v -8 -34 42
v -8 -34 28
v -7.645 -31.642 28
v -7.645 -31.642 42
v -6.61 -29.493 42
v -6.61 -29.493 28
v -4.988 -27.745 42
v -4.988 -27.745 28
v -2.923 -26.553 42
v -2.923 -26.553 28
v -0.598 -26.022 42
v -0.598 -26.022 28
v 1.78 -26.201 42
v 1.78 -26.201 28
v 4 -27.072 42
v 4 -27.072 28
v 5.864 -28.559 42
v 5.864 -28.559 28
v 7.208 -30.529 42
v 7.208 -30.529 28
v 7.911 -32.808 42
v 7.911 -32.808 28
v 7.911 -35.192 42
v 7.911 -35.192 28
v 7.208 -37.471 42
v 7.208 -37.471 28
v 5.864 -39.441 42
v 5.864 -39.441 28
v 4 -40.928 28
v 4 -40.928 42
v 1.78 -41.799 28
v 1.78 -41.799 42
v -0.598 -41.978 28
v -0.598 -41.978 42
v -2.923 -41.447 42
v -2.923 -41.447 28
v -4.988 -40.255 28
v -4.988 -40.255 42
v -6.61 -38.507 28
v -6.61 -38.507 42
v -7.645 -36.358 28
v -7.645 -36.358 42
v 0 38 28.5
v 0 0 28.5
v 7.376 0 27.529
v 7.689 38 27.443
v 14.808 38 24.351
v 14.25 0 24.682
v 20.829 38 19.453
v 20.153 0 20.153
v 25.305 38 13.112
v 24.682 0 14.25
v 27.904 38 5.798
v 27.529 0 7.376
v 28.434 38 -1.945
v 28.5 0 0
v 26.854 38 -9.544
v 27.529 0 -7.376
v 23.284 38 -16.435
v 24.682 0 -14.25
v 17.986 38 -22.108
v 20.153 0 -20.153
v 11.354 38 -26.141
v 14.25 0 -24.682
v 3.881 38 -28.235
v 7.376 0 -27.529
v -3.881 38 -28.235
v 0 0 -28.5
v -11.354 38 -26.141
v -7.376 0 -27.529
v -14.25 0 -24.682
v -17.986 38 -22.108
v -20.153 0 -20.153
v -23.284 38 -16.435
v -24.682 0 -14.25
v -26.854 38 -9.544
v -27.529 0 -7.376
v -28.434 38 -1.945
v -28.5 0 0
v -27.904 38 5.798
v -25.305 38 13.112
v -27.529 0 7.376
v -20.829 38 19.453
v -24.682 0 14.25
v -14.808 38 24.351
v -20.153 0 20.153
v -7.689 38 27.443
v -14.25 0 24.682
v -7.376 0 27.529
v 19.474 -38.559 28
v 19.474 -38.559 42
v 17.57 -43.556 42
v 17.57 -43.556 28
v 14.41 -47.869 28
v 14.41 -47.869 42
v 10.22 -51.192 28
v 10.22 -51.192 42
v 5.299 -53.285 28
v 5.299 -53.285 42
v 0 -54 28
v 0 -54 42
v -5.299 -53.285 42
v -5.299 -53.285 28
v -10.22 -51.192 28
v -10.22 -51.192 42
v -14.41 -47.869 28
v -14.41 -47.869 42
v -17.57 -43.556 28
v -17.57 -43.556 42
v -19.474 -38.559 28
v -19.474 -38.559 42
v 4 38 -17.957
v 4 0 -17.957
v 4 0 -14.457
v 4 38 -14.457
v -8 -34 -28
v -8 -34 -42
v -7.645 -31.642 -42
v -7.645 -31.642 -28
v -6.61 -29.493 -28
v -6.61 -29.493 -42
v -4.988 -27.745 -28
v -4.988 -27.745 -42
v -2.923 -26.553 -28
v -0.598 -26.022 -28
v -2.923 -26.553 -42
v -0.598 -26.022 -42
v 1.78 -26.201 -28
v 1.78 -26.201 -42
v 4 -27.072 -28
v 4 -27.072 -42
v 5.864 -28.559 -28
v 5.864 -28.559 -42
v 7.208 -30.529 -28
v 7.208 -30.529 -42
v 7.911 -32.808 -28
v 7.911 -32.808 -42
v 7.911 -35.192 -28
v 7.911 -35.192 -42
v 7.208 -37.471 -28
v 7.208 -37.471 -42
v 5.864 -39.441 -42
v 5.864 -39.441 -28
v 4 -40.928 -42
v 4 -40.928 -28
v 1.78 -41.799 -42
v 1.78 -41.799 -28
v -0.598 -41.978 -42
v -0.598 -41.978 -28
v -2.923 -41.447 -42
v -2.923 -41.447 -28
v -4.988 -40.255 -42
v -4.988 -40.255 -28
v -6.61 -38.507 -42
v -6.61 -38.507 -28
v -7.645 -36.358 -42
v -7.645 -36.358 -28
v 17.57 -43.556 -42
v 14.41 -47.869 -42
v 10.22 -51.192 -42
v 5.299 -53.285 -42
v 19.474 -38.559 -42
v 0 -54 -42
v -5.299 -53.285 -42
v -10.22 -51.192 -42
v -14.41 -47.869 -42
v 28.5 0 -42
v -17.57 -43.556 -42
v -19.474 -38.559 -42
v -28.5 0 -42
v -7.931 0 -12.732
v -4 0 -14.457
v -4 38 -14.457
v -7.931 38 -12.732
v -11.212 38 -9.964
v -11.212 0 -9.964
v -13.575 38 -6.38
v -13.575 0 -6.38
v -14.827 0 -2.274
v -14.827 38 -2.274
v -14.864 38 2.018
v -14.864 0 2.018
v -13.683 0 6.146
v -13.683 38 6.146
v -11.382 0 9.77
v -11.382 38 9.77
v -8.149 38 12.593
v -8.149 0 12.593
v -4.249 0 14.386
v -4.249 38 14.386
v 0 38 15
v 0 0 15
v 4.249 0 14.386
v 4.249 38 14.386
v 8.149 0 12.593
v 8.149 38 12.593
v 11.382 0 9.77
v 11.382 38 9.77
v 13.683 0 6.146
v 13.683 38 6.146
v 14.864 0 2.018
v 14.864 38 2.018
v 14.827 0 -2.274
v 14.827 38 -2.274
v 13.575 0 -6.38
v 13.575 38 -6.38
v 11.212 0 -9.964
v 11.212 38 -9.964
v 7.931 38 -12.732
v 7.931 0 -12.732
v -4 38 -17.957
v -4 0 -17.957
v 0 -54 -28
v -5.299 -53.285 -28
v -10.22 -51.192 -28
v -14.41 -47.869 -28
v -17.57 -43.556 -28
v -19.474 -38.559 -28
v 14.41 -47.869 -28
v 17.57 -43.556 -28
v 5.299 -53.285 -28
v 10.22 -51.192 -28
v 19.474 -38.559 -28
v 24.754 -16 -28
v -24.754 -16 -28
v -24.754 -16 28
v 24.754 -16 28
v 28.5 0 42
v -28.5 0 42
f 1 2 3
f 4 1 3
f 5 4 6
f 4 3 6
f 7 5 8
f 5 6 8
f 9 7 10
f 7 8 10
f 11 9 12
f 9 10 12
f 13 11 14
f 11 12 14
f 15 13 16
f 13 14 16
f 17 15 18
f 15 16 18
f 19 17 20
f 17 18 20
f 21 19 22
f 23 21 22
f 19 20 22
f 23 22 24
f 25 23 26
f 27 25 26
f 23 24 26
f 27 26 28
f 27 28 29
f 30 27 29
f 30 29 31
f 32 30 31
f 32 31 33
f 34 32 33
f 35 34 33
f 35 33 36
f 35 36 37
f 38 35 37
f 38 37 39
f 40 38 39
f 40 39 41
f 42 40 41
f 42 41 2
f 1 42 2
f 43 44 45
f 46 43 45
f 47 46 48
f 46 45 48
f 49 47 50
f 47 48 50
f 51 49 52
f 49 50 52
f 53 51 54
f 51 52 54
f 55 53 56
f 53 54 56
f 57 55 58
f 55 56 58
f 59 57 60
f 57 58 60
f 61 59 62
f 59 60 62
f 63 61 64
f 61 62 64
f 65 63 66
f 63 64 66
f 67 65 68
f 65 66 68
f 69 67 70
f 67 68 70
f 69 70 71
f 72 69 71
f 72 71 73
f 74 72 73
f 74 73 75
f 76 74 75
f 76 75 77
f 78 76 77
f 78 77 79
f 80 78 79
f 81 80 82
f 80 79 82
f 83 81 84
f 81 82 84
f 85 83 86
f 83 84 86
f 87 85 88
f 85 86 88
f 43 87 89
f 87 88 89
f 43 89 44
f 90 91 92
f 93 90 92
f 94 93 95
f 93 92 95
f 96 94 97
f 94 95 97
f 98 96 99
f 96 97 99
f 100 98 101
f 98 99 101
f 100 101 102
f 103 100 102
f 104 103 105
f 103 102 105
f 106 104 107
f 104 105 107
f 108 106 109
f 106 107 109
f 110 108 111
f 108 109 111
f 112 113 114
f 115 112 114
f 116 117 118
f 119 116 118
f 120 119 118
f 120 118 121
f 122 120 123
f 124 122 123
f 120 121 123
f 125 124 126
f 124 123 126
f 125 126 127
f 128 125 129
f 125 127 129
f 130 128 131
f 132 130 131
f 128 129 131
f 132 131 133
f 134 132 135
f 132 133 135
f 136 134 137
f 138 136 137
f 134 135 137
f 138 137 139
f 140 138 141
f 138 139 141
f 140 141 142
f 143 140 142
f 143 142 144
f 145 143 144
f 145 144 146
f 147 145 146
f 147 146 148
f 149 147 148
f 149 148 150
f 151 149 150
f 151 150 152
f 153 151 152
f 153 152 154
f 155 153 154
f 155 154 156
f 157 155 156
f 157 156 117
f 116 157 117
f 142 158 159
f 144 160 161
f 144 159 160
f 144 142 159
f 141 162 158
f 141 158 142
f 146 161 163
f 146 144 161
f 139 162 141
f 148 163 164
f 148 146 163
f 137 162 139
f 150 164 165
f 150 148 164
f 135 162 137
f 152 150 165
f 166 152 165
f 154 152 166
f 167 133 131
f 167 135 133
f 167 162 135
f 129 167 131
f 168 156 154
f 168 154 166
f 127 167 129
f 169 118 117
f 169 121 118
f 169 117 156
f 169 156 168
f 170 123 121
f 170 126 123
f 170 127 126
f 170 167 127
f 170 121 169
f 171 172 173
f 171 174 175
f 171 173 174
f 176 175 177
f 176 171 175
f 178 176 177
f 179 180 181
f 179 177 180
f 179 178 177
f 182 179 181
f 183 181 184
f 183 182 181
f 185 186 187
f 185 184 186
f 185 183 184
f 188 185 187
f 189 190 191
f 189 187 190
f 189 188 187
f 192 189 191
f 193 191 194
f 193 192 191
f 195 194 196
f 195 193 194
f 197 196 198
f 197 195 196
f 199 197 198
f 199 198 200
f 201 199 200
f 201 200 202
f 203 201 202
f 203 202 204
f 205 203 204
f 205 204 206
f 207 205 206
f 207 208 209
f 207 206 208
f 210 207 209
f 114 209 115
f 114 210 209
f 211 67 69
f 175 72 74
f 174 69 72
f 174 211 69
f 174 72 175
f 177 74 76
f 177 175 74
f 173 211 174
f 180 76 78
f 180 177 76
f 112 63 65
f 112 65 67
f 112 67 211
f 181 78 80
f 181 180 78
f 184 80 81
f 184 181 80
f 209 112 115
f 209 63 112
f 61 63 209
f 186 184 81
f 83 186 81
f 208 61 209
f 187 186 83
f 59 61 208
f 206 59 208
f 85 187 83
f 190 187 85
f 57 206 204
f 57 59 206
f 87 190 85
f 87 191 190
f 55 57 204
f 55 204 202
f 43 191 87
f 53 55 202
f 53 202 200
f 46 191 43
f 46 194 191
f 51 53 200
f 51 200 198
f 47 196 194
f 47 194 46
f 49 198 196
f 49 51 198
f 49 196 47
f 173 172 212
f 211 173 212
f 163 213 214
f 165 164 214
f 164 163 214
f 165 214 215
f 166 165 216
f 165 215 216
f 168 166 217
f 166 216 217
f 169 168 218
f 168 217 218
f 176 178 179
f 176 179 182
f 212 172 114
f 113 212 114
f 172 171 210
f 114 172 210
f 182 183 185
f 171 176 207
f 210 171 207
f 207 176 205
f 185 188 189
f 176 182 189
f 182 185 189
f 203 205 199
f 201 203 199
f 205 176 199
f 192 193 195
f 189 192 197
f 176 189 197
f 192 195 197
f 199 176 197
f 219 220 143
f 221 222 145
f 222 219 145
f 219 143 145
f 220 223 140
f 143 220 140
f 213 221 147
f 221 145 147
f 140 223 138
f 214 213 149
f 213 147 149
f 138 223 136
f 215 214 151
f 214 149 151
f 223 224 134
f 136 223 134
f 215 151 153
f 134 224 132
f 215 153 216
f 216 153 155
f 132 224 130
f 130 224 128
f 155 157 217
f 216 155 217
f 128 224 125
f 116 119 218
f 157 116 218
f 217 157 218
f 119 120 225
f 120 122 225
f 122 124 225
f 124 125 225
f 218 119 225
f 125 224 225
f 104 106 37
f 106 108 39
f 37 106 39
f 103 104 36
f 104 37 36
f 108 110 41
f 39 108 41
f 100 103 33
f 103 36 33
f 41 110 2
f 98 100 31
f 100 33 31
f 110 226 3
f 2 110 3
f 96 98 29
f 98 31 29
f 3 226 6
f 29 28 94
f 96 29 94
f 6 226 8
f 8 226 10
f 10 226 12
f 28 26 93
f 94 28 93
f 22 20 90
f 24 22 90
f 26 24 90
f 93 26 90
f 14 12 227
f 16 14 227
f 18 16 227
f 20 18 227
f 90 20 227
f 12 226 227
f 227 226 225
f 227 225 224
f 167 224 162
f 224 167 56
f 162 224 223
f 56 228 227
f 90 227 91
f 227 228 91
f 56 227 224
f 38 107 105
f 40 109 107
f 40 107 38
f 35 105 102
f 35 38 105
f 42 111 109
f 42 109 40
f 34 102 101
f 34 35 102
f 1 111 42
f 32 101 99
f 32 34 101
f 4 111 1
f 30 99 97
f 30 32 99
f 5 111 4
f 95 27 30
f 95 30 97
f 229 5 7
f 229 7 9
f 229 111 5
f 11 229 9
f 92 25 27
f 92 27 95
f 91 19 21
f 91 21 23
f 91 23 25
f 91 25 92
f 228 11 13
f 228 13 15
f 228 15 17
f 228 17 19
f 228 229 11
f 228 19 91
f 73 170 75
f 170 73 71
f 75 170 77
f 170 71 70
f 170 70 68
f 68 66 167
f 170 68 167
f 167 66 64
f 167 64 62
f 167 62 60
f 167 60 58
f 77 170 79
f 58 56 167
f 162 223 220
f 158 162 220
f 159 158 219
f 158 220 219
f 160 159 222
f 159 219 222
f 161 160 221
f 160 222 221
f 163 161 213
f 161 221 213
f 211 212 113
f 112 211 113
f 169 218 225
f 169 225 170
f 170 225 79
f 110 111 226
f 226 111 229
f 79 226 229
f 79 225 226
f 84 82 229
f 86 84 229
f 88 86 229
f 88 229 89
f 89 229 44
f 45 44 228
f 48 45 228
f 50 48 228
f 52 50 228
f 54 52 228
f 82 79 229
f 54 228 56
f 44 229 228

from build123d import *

# Parameters (mm, degrees)
SKETCH1_R           = 28.5
SKETCH1_R_2         = 15
BOSS_EXTRUDE1_DEPTH = 38
SKETCH2_W           = 57
SKETCH2_H           = 84
BOSS_EXTRUDE2_DEPTH = 16
SKETCH6_W           = 57
SKETCH6_H           = 38
BOSS_EXTRUDE4_DEPTH = 14
SKETCH7_W           = 57
SKETCH7_H           = 38
BOSS_EXTRUDE5_DEPTH = 14
SKETCH8_R           = 8
CUT_EXTRUDE3_DEPTH  = 104.847243584
CUT_EXTRUDE4_DEPTH  = 104.847243584
CUT_EXTRUDE5_START  = -38
CUT_EXTRUDE5_DEPTH  = 38


with BuildPart() as part:
    # Sketch1 → Boss-Extrude1 (new body)
    with BuildSketch(Plane(origin=(0, 0, 0), x_dir=(1, 0, 0), z_dir=(0, 1, 0))):
        with Locations(Location((0, 0, 0), (0, 0, 270))):
            Circle(SKETCH1_R)
        with Locations(Location((0, 0, 0), (0, 0, 270))):
            Circle(SKETCH1_R_2, mode=Mode.SUBTRACT)
    extrude(amount=BOSS_EXTRUDE1_DEPTH)

    # Sketch2 → Boss-Extrude2 (add)
    with BuildSketch(Plane.XZ):
        Rectangle(SKETCH2_W, SKETCH2_H)
    extrude(amount=BOSS_EXTRUDE2_DEPTH)

    # Sketch6 → Boss-Extrude4 (add)
    with BuildSketch(Plane.XY.offset(42)):
        with Locations((0, -35)):
            Rectangle(SKETCH6_W, SKETCH6_H)
    extrude(amount=-BOSS_EXTRUDE4_DEPTH)

    # Sketch7 → Boss-Extrude5 (add)
    with BuildSketch(Plane(origin=(0, 0, -42), x_dir=(-1, 0, 0), z_dir=(0, 0, -1))):
        with Locations((0, -35)):
            Rectangle(SKETCH7_W, SKETCH7_H)
    extrude(amount=-BOSS_EXTRUDE5_DEPTH)

    # Sketch8 → Cut-Extrude3 (cut, through all)
    with BuildSketch(Plane(origin=(0, 0, -42), x_dir=(-1, 0, 0), z_dir=(0, 0, -1))):
        with Locations((0, -34)):
            Circle(SKETCH8_R)
    extrude(amount=-CUT_EXTRUDE3_DEPTH, mode=Mode.SUBTRACT)

    # Sketch9 → Cut-Extrude4 (cut, through all)
    with BuildSketch(Plane.XY.offset(42)):
        with BuildLine():
            Line((-19.473528625, -38.558693112), (-28.5, 0))
            Line((-28.5, 0), (-28.5, -54))
            Line((-28.5, -54), (0, -54))
            ThreePointArc((0, -54), (-12.42630552, -49.671213454), (-19.473528625, -38.558693112))
        make_face()
        with BuildLine():
            ThreePointArc((19.473522225, -38.558720453), (12.426294519, -49.671222177), (0, -54))
            Line((0, -54), (28.5, -54))
            Line((28.5, -54), (28.5, 0))
            Line((28.5, 0), (19.473522225, -38.558720453))
        make_face()
    extrude(amount=-CUT_EXTRUDE4_DEPTH, mode=Mode.SUBTRACT)

    # Sketch11 → Cut-Extrude5 (cut)
    with BuildSketch(Plane(origin=(0, 38, 0), x_dir=(1, 0, 0), z_dir=(0, 1, 0)).offset(CUT_EXTRUDE5_START)):
        with BuildLine():
            Line((-4, 17.956832295), (4, 17.956832295))
            Line((4, 17.956832295), (4, 14.456832295))
            ThreePointArc((4, 14.456832295), (0, 15), (-4, 14.456832295))
            Line((-4, 14.456832295), (-4, 17.956832295))
        make_face()
    extrude(amount=CUT_EXTRUDE5_DEPTH, mode=Mode.SUBTRACT)


solid = part.part
